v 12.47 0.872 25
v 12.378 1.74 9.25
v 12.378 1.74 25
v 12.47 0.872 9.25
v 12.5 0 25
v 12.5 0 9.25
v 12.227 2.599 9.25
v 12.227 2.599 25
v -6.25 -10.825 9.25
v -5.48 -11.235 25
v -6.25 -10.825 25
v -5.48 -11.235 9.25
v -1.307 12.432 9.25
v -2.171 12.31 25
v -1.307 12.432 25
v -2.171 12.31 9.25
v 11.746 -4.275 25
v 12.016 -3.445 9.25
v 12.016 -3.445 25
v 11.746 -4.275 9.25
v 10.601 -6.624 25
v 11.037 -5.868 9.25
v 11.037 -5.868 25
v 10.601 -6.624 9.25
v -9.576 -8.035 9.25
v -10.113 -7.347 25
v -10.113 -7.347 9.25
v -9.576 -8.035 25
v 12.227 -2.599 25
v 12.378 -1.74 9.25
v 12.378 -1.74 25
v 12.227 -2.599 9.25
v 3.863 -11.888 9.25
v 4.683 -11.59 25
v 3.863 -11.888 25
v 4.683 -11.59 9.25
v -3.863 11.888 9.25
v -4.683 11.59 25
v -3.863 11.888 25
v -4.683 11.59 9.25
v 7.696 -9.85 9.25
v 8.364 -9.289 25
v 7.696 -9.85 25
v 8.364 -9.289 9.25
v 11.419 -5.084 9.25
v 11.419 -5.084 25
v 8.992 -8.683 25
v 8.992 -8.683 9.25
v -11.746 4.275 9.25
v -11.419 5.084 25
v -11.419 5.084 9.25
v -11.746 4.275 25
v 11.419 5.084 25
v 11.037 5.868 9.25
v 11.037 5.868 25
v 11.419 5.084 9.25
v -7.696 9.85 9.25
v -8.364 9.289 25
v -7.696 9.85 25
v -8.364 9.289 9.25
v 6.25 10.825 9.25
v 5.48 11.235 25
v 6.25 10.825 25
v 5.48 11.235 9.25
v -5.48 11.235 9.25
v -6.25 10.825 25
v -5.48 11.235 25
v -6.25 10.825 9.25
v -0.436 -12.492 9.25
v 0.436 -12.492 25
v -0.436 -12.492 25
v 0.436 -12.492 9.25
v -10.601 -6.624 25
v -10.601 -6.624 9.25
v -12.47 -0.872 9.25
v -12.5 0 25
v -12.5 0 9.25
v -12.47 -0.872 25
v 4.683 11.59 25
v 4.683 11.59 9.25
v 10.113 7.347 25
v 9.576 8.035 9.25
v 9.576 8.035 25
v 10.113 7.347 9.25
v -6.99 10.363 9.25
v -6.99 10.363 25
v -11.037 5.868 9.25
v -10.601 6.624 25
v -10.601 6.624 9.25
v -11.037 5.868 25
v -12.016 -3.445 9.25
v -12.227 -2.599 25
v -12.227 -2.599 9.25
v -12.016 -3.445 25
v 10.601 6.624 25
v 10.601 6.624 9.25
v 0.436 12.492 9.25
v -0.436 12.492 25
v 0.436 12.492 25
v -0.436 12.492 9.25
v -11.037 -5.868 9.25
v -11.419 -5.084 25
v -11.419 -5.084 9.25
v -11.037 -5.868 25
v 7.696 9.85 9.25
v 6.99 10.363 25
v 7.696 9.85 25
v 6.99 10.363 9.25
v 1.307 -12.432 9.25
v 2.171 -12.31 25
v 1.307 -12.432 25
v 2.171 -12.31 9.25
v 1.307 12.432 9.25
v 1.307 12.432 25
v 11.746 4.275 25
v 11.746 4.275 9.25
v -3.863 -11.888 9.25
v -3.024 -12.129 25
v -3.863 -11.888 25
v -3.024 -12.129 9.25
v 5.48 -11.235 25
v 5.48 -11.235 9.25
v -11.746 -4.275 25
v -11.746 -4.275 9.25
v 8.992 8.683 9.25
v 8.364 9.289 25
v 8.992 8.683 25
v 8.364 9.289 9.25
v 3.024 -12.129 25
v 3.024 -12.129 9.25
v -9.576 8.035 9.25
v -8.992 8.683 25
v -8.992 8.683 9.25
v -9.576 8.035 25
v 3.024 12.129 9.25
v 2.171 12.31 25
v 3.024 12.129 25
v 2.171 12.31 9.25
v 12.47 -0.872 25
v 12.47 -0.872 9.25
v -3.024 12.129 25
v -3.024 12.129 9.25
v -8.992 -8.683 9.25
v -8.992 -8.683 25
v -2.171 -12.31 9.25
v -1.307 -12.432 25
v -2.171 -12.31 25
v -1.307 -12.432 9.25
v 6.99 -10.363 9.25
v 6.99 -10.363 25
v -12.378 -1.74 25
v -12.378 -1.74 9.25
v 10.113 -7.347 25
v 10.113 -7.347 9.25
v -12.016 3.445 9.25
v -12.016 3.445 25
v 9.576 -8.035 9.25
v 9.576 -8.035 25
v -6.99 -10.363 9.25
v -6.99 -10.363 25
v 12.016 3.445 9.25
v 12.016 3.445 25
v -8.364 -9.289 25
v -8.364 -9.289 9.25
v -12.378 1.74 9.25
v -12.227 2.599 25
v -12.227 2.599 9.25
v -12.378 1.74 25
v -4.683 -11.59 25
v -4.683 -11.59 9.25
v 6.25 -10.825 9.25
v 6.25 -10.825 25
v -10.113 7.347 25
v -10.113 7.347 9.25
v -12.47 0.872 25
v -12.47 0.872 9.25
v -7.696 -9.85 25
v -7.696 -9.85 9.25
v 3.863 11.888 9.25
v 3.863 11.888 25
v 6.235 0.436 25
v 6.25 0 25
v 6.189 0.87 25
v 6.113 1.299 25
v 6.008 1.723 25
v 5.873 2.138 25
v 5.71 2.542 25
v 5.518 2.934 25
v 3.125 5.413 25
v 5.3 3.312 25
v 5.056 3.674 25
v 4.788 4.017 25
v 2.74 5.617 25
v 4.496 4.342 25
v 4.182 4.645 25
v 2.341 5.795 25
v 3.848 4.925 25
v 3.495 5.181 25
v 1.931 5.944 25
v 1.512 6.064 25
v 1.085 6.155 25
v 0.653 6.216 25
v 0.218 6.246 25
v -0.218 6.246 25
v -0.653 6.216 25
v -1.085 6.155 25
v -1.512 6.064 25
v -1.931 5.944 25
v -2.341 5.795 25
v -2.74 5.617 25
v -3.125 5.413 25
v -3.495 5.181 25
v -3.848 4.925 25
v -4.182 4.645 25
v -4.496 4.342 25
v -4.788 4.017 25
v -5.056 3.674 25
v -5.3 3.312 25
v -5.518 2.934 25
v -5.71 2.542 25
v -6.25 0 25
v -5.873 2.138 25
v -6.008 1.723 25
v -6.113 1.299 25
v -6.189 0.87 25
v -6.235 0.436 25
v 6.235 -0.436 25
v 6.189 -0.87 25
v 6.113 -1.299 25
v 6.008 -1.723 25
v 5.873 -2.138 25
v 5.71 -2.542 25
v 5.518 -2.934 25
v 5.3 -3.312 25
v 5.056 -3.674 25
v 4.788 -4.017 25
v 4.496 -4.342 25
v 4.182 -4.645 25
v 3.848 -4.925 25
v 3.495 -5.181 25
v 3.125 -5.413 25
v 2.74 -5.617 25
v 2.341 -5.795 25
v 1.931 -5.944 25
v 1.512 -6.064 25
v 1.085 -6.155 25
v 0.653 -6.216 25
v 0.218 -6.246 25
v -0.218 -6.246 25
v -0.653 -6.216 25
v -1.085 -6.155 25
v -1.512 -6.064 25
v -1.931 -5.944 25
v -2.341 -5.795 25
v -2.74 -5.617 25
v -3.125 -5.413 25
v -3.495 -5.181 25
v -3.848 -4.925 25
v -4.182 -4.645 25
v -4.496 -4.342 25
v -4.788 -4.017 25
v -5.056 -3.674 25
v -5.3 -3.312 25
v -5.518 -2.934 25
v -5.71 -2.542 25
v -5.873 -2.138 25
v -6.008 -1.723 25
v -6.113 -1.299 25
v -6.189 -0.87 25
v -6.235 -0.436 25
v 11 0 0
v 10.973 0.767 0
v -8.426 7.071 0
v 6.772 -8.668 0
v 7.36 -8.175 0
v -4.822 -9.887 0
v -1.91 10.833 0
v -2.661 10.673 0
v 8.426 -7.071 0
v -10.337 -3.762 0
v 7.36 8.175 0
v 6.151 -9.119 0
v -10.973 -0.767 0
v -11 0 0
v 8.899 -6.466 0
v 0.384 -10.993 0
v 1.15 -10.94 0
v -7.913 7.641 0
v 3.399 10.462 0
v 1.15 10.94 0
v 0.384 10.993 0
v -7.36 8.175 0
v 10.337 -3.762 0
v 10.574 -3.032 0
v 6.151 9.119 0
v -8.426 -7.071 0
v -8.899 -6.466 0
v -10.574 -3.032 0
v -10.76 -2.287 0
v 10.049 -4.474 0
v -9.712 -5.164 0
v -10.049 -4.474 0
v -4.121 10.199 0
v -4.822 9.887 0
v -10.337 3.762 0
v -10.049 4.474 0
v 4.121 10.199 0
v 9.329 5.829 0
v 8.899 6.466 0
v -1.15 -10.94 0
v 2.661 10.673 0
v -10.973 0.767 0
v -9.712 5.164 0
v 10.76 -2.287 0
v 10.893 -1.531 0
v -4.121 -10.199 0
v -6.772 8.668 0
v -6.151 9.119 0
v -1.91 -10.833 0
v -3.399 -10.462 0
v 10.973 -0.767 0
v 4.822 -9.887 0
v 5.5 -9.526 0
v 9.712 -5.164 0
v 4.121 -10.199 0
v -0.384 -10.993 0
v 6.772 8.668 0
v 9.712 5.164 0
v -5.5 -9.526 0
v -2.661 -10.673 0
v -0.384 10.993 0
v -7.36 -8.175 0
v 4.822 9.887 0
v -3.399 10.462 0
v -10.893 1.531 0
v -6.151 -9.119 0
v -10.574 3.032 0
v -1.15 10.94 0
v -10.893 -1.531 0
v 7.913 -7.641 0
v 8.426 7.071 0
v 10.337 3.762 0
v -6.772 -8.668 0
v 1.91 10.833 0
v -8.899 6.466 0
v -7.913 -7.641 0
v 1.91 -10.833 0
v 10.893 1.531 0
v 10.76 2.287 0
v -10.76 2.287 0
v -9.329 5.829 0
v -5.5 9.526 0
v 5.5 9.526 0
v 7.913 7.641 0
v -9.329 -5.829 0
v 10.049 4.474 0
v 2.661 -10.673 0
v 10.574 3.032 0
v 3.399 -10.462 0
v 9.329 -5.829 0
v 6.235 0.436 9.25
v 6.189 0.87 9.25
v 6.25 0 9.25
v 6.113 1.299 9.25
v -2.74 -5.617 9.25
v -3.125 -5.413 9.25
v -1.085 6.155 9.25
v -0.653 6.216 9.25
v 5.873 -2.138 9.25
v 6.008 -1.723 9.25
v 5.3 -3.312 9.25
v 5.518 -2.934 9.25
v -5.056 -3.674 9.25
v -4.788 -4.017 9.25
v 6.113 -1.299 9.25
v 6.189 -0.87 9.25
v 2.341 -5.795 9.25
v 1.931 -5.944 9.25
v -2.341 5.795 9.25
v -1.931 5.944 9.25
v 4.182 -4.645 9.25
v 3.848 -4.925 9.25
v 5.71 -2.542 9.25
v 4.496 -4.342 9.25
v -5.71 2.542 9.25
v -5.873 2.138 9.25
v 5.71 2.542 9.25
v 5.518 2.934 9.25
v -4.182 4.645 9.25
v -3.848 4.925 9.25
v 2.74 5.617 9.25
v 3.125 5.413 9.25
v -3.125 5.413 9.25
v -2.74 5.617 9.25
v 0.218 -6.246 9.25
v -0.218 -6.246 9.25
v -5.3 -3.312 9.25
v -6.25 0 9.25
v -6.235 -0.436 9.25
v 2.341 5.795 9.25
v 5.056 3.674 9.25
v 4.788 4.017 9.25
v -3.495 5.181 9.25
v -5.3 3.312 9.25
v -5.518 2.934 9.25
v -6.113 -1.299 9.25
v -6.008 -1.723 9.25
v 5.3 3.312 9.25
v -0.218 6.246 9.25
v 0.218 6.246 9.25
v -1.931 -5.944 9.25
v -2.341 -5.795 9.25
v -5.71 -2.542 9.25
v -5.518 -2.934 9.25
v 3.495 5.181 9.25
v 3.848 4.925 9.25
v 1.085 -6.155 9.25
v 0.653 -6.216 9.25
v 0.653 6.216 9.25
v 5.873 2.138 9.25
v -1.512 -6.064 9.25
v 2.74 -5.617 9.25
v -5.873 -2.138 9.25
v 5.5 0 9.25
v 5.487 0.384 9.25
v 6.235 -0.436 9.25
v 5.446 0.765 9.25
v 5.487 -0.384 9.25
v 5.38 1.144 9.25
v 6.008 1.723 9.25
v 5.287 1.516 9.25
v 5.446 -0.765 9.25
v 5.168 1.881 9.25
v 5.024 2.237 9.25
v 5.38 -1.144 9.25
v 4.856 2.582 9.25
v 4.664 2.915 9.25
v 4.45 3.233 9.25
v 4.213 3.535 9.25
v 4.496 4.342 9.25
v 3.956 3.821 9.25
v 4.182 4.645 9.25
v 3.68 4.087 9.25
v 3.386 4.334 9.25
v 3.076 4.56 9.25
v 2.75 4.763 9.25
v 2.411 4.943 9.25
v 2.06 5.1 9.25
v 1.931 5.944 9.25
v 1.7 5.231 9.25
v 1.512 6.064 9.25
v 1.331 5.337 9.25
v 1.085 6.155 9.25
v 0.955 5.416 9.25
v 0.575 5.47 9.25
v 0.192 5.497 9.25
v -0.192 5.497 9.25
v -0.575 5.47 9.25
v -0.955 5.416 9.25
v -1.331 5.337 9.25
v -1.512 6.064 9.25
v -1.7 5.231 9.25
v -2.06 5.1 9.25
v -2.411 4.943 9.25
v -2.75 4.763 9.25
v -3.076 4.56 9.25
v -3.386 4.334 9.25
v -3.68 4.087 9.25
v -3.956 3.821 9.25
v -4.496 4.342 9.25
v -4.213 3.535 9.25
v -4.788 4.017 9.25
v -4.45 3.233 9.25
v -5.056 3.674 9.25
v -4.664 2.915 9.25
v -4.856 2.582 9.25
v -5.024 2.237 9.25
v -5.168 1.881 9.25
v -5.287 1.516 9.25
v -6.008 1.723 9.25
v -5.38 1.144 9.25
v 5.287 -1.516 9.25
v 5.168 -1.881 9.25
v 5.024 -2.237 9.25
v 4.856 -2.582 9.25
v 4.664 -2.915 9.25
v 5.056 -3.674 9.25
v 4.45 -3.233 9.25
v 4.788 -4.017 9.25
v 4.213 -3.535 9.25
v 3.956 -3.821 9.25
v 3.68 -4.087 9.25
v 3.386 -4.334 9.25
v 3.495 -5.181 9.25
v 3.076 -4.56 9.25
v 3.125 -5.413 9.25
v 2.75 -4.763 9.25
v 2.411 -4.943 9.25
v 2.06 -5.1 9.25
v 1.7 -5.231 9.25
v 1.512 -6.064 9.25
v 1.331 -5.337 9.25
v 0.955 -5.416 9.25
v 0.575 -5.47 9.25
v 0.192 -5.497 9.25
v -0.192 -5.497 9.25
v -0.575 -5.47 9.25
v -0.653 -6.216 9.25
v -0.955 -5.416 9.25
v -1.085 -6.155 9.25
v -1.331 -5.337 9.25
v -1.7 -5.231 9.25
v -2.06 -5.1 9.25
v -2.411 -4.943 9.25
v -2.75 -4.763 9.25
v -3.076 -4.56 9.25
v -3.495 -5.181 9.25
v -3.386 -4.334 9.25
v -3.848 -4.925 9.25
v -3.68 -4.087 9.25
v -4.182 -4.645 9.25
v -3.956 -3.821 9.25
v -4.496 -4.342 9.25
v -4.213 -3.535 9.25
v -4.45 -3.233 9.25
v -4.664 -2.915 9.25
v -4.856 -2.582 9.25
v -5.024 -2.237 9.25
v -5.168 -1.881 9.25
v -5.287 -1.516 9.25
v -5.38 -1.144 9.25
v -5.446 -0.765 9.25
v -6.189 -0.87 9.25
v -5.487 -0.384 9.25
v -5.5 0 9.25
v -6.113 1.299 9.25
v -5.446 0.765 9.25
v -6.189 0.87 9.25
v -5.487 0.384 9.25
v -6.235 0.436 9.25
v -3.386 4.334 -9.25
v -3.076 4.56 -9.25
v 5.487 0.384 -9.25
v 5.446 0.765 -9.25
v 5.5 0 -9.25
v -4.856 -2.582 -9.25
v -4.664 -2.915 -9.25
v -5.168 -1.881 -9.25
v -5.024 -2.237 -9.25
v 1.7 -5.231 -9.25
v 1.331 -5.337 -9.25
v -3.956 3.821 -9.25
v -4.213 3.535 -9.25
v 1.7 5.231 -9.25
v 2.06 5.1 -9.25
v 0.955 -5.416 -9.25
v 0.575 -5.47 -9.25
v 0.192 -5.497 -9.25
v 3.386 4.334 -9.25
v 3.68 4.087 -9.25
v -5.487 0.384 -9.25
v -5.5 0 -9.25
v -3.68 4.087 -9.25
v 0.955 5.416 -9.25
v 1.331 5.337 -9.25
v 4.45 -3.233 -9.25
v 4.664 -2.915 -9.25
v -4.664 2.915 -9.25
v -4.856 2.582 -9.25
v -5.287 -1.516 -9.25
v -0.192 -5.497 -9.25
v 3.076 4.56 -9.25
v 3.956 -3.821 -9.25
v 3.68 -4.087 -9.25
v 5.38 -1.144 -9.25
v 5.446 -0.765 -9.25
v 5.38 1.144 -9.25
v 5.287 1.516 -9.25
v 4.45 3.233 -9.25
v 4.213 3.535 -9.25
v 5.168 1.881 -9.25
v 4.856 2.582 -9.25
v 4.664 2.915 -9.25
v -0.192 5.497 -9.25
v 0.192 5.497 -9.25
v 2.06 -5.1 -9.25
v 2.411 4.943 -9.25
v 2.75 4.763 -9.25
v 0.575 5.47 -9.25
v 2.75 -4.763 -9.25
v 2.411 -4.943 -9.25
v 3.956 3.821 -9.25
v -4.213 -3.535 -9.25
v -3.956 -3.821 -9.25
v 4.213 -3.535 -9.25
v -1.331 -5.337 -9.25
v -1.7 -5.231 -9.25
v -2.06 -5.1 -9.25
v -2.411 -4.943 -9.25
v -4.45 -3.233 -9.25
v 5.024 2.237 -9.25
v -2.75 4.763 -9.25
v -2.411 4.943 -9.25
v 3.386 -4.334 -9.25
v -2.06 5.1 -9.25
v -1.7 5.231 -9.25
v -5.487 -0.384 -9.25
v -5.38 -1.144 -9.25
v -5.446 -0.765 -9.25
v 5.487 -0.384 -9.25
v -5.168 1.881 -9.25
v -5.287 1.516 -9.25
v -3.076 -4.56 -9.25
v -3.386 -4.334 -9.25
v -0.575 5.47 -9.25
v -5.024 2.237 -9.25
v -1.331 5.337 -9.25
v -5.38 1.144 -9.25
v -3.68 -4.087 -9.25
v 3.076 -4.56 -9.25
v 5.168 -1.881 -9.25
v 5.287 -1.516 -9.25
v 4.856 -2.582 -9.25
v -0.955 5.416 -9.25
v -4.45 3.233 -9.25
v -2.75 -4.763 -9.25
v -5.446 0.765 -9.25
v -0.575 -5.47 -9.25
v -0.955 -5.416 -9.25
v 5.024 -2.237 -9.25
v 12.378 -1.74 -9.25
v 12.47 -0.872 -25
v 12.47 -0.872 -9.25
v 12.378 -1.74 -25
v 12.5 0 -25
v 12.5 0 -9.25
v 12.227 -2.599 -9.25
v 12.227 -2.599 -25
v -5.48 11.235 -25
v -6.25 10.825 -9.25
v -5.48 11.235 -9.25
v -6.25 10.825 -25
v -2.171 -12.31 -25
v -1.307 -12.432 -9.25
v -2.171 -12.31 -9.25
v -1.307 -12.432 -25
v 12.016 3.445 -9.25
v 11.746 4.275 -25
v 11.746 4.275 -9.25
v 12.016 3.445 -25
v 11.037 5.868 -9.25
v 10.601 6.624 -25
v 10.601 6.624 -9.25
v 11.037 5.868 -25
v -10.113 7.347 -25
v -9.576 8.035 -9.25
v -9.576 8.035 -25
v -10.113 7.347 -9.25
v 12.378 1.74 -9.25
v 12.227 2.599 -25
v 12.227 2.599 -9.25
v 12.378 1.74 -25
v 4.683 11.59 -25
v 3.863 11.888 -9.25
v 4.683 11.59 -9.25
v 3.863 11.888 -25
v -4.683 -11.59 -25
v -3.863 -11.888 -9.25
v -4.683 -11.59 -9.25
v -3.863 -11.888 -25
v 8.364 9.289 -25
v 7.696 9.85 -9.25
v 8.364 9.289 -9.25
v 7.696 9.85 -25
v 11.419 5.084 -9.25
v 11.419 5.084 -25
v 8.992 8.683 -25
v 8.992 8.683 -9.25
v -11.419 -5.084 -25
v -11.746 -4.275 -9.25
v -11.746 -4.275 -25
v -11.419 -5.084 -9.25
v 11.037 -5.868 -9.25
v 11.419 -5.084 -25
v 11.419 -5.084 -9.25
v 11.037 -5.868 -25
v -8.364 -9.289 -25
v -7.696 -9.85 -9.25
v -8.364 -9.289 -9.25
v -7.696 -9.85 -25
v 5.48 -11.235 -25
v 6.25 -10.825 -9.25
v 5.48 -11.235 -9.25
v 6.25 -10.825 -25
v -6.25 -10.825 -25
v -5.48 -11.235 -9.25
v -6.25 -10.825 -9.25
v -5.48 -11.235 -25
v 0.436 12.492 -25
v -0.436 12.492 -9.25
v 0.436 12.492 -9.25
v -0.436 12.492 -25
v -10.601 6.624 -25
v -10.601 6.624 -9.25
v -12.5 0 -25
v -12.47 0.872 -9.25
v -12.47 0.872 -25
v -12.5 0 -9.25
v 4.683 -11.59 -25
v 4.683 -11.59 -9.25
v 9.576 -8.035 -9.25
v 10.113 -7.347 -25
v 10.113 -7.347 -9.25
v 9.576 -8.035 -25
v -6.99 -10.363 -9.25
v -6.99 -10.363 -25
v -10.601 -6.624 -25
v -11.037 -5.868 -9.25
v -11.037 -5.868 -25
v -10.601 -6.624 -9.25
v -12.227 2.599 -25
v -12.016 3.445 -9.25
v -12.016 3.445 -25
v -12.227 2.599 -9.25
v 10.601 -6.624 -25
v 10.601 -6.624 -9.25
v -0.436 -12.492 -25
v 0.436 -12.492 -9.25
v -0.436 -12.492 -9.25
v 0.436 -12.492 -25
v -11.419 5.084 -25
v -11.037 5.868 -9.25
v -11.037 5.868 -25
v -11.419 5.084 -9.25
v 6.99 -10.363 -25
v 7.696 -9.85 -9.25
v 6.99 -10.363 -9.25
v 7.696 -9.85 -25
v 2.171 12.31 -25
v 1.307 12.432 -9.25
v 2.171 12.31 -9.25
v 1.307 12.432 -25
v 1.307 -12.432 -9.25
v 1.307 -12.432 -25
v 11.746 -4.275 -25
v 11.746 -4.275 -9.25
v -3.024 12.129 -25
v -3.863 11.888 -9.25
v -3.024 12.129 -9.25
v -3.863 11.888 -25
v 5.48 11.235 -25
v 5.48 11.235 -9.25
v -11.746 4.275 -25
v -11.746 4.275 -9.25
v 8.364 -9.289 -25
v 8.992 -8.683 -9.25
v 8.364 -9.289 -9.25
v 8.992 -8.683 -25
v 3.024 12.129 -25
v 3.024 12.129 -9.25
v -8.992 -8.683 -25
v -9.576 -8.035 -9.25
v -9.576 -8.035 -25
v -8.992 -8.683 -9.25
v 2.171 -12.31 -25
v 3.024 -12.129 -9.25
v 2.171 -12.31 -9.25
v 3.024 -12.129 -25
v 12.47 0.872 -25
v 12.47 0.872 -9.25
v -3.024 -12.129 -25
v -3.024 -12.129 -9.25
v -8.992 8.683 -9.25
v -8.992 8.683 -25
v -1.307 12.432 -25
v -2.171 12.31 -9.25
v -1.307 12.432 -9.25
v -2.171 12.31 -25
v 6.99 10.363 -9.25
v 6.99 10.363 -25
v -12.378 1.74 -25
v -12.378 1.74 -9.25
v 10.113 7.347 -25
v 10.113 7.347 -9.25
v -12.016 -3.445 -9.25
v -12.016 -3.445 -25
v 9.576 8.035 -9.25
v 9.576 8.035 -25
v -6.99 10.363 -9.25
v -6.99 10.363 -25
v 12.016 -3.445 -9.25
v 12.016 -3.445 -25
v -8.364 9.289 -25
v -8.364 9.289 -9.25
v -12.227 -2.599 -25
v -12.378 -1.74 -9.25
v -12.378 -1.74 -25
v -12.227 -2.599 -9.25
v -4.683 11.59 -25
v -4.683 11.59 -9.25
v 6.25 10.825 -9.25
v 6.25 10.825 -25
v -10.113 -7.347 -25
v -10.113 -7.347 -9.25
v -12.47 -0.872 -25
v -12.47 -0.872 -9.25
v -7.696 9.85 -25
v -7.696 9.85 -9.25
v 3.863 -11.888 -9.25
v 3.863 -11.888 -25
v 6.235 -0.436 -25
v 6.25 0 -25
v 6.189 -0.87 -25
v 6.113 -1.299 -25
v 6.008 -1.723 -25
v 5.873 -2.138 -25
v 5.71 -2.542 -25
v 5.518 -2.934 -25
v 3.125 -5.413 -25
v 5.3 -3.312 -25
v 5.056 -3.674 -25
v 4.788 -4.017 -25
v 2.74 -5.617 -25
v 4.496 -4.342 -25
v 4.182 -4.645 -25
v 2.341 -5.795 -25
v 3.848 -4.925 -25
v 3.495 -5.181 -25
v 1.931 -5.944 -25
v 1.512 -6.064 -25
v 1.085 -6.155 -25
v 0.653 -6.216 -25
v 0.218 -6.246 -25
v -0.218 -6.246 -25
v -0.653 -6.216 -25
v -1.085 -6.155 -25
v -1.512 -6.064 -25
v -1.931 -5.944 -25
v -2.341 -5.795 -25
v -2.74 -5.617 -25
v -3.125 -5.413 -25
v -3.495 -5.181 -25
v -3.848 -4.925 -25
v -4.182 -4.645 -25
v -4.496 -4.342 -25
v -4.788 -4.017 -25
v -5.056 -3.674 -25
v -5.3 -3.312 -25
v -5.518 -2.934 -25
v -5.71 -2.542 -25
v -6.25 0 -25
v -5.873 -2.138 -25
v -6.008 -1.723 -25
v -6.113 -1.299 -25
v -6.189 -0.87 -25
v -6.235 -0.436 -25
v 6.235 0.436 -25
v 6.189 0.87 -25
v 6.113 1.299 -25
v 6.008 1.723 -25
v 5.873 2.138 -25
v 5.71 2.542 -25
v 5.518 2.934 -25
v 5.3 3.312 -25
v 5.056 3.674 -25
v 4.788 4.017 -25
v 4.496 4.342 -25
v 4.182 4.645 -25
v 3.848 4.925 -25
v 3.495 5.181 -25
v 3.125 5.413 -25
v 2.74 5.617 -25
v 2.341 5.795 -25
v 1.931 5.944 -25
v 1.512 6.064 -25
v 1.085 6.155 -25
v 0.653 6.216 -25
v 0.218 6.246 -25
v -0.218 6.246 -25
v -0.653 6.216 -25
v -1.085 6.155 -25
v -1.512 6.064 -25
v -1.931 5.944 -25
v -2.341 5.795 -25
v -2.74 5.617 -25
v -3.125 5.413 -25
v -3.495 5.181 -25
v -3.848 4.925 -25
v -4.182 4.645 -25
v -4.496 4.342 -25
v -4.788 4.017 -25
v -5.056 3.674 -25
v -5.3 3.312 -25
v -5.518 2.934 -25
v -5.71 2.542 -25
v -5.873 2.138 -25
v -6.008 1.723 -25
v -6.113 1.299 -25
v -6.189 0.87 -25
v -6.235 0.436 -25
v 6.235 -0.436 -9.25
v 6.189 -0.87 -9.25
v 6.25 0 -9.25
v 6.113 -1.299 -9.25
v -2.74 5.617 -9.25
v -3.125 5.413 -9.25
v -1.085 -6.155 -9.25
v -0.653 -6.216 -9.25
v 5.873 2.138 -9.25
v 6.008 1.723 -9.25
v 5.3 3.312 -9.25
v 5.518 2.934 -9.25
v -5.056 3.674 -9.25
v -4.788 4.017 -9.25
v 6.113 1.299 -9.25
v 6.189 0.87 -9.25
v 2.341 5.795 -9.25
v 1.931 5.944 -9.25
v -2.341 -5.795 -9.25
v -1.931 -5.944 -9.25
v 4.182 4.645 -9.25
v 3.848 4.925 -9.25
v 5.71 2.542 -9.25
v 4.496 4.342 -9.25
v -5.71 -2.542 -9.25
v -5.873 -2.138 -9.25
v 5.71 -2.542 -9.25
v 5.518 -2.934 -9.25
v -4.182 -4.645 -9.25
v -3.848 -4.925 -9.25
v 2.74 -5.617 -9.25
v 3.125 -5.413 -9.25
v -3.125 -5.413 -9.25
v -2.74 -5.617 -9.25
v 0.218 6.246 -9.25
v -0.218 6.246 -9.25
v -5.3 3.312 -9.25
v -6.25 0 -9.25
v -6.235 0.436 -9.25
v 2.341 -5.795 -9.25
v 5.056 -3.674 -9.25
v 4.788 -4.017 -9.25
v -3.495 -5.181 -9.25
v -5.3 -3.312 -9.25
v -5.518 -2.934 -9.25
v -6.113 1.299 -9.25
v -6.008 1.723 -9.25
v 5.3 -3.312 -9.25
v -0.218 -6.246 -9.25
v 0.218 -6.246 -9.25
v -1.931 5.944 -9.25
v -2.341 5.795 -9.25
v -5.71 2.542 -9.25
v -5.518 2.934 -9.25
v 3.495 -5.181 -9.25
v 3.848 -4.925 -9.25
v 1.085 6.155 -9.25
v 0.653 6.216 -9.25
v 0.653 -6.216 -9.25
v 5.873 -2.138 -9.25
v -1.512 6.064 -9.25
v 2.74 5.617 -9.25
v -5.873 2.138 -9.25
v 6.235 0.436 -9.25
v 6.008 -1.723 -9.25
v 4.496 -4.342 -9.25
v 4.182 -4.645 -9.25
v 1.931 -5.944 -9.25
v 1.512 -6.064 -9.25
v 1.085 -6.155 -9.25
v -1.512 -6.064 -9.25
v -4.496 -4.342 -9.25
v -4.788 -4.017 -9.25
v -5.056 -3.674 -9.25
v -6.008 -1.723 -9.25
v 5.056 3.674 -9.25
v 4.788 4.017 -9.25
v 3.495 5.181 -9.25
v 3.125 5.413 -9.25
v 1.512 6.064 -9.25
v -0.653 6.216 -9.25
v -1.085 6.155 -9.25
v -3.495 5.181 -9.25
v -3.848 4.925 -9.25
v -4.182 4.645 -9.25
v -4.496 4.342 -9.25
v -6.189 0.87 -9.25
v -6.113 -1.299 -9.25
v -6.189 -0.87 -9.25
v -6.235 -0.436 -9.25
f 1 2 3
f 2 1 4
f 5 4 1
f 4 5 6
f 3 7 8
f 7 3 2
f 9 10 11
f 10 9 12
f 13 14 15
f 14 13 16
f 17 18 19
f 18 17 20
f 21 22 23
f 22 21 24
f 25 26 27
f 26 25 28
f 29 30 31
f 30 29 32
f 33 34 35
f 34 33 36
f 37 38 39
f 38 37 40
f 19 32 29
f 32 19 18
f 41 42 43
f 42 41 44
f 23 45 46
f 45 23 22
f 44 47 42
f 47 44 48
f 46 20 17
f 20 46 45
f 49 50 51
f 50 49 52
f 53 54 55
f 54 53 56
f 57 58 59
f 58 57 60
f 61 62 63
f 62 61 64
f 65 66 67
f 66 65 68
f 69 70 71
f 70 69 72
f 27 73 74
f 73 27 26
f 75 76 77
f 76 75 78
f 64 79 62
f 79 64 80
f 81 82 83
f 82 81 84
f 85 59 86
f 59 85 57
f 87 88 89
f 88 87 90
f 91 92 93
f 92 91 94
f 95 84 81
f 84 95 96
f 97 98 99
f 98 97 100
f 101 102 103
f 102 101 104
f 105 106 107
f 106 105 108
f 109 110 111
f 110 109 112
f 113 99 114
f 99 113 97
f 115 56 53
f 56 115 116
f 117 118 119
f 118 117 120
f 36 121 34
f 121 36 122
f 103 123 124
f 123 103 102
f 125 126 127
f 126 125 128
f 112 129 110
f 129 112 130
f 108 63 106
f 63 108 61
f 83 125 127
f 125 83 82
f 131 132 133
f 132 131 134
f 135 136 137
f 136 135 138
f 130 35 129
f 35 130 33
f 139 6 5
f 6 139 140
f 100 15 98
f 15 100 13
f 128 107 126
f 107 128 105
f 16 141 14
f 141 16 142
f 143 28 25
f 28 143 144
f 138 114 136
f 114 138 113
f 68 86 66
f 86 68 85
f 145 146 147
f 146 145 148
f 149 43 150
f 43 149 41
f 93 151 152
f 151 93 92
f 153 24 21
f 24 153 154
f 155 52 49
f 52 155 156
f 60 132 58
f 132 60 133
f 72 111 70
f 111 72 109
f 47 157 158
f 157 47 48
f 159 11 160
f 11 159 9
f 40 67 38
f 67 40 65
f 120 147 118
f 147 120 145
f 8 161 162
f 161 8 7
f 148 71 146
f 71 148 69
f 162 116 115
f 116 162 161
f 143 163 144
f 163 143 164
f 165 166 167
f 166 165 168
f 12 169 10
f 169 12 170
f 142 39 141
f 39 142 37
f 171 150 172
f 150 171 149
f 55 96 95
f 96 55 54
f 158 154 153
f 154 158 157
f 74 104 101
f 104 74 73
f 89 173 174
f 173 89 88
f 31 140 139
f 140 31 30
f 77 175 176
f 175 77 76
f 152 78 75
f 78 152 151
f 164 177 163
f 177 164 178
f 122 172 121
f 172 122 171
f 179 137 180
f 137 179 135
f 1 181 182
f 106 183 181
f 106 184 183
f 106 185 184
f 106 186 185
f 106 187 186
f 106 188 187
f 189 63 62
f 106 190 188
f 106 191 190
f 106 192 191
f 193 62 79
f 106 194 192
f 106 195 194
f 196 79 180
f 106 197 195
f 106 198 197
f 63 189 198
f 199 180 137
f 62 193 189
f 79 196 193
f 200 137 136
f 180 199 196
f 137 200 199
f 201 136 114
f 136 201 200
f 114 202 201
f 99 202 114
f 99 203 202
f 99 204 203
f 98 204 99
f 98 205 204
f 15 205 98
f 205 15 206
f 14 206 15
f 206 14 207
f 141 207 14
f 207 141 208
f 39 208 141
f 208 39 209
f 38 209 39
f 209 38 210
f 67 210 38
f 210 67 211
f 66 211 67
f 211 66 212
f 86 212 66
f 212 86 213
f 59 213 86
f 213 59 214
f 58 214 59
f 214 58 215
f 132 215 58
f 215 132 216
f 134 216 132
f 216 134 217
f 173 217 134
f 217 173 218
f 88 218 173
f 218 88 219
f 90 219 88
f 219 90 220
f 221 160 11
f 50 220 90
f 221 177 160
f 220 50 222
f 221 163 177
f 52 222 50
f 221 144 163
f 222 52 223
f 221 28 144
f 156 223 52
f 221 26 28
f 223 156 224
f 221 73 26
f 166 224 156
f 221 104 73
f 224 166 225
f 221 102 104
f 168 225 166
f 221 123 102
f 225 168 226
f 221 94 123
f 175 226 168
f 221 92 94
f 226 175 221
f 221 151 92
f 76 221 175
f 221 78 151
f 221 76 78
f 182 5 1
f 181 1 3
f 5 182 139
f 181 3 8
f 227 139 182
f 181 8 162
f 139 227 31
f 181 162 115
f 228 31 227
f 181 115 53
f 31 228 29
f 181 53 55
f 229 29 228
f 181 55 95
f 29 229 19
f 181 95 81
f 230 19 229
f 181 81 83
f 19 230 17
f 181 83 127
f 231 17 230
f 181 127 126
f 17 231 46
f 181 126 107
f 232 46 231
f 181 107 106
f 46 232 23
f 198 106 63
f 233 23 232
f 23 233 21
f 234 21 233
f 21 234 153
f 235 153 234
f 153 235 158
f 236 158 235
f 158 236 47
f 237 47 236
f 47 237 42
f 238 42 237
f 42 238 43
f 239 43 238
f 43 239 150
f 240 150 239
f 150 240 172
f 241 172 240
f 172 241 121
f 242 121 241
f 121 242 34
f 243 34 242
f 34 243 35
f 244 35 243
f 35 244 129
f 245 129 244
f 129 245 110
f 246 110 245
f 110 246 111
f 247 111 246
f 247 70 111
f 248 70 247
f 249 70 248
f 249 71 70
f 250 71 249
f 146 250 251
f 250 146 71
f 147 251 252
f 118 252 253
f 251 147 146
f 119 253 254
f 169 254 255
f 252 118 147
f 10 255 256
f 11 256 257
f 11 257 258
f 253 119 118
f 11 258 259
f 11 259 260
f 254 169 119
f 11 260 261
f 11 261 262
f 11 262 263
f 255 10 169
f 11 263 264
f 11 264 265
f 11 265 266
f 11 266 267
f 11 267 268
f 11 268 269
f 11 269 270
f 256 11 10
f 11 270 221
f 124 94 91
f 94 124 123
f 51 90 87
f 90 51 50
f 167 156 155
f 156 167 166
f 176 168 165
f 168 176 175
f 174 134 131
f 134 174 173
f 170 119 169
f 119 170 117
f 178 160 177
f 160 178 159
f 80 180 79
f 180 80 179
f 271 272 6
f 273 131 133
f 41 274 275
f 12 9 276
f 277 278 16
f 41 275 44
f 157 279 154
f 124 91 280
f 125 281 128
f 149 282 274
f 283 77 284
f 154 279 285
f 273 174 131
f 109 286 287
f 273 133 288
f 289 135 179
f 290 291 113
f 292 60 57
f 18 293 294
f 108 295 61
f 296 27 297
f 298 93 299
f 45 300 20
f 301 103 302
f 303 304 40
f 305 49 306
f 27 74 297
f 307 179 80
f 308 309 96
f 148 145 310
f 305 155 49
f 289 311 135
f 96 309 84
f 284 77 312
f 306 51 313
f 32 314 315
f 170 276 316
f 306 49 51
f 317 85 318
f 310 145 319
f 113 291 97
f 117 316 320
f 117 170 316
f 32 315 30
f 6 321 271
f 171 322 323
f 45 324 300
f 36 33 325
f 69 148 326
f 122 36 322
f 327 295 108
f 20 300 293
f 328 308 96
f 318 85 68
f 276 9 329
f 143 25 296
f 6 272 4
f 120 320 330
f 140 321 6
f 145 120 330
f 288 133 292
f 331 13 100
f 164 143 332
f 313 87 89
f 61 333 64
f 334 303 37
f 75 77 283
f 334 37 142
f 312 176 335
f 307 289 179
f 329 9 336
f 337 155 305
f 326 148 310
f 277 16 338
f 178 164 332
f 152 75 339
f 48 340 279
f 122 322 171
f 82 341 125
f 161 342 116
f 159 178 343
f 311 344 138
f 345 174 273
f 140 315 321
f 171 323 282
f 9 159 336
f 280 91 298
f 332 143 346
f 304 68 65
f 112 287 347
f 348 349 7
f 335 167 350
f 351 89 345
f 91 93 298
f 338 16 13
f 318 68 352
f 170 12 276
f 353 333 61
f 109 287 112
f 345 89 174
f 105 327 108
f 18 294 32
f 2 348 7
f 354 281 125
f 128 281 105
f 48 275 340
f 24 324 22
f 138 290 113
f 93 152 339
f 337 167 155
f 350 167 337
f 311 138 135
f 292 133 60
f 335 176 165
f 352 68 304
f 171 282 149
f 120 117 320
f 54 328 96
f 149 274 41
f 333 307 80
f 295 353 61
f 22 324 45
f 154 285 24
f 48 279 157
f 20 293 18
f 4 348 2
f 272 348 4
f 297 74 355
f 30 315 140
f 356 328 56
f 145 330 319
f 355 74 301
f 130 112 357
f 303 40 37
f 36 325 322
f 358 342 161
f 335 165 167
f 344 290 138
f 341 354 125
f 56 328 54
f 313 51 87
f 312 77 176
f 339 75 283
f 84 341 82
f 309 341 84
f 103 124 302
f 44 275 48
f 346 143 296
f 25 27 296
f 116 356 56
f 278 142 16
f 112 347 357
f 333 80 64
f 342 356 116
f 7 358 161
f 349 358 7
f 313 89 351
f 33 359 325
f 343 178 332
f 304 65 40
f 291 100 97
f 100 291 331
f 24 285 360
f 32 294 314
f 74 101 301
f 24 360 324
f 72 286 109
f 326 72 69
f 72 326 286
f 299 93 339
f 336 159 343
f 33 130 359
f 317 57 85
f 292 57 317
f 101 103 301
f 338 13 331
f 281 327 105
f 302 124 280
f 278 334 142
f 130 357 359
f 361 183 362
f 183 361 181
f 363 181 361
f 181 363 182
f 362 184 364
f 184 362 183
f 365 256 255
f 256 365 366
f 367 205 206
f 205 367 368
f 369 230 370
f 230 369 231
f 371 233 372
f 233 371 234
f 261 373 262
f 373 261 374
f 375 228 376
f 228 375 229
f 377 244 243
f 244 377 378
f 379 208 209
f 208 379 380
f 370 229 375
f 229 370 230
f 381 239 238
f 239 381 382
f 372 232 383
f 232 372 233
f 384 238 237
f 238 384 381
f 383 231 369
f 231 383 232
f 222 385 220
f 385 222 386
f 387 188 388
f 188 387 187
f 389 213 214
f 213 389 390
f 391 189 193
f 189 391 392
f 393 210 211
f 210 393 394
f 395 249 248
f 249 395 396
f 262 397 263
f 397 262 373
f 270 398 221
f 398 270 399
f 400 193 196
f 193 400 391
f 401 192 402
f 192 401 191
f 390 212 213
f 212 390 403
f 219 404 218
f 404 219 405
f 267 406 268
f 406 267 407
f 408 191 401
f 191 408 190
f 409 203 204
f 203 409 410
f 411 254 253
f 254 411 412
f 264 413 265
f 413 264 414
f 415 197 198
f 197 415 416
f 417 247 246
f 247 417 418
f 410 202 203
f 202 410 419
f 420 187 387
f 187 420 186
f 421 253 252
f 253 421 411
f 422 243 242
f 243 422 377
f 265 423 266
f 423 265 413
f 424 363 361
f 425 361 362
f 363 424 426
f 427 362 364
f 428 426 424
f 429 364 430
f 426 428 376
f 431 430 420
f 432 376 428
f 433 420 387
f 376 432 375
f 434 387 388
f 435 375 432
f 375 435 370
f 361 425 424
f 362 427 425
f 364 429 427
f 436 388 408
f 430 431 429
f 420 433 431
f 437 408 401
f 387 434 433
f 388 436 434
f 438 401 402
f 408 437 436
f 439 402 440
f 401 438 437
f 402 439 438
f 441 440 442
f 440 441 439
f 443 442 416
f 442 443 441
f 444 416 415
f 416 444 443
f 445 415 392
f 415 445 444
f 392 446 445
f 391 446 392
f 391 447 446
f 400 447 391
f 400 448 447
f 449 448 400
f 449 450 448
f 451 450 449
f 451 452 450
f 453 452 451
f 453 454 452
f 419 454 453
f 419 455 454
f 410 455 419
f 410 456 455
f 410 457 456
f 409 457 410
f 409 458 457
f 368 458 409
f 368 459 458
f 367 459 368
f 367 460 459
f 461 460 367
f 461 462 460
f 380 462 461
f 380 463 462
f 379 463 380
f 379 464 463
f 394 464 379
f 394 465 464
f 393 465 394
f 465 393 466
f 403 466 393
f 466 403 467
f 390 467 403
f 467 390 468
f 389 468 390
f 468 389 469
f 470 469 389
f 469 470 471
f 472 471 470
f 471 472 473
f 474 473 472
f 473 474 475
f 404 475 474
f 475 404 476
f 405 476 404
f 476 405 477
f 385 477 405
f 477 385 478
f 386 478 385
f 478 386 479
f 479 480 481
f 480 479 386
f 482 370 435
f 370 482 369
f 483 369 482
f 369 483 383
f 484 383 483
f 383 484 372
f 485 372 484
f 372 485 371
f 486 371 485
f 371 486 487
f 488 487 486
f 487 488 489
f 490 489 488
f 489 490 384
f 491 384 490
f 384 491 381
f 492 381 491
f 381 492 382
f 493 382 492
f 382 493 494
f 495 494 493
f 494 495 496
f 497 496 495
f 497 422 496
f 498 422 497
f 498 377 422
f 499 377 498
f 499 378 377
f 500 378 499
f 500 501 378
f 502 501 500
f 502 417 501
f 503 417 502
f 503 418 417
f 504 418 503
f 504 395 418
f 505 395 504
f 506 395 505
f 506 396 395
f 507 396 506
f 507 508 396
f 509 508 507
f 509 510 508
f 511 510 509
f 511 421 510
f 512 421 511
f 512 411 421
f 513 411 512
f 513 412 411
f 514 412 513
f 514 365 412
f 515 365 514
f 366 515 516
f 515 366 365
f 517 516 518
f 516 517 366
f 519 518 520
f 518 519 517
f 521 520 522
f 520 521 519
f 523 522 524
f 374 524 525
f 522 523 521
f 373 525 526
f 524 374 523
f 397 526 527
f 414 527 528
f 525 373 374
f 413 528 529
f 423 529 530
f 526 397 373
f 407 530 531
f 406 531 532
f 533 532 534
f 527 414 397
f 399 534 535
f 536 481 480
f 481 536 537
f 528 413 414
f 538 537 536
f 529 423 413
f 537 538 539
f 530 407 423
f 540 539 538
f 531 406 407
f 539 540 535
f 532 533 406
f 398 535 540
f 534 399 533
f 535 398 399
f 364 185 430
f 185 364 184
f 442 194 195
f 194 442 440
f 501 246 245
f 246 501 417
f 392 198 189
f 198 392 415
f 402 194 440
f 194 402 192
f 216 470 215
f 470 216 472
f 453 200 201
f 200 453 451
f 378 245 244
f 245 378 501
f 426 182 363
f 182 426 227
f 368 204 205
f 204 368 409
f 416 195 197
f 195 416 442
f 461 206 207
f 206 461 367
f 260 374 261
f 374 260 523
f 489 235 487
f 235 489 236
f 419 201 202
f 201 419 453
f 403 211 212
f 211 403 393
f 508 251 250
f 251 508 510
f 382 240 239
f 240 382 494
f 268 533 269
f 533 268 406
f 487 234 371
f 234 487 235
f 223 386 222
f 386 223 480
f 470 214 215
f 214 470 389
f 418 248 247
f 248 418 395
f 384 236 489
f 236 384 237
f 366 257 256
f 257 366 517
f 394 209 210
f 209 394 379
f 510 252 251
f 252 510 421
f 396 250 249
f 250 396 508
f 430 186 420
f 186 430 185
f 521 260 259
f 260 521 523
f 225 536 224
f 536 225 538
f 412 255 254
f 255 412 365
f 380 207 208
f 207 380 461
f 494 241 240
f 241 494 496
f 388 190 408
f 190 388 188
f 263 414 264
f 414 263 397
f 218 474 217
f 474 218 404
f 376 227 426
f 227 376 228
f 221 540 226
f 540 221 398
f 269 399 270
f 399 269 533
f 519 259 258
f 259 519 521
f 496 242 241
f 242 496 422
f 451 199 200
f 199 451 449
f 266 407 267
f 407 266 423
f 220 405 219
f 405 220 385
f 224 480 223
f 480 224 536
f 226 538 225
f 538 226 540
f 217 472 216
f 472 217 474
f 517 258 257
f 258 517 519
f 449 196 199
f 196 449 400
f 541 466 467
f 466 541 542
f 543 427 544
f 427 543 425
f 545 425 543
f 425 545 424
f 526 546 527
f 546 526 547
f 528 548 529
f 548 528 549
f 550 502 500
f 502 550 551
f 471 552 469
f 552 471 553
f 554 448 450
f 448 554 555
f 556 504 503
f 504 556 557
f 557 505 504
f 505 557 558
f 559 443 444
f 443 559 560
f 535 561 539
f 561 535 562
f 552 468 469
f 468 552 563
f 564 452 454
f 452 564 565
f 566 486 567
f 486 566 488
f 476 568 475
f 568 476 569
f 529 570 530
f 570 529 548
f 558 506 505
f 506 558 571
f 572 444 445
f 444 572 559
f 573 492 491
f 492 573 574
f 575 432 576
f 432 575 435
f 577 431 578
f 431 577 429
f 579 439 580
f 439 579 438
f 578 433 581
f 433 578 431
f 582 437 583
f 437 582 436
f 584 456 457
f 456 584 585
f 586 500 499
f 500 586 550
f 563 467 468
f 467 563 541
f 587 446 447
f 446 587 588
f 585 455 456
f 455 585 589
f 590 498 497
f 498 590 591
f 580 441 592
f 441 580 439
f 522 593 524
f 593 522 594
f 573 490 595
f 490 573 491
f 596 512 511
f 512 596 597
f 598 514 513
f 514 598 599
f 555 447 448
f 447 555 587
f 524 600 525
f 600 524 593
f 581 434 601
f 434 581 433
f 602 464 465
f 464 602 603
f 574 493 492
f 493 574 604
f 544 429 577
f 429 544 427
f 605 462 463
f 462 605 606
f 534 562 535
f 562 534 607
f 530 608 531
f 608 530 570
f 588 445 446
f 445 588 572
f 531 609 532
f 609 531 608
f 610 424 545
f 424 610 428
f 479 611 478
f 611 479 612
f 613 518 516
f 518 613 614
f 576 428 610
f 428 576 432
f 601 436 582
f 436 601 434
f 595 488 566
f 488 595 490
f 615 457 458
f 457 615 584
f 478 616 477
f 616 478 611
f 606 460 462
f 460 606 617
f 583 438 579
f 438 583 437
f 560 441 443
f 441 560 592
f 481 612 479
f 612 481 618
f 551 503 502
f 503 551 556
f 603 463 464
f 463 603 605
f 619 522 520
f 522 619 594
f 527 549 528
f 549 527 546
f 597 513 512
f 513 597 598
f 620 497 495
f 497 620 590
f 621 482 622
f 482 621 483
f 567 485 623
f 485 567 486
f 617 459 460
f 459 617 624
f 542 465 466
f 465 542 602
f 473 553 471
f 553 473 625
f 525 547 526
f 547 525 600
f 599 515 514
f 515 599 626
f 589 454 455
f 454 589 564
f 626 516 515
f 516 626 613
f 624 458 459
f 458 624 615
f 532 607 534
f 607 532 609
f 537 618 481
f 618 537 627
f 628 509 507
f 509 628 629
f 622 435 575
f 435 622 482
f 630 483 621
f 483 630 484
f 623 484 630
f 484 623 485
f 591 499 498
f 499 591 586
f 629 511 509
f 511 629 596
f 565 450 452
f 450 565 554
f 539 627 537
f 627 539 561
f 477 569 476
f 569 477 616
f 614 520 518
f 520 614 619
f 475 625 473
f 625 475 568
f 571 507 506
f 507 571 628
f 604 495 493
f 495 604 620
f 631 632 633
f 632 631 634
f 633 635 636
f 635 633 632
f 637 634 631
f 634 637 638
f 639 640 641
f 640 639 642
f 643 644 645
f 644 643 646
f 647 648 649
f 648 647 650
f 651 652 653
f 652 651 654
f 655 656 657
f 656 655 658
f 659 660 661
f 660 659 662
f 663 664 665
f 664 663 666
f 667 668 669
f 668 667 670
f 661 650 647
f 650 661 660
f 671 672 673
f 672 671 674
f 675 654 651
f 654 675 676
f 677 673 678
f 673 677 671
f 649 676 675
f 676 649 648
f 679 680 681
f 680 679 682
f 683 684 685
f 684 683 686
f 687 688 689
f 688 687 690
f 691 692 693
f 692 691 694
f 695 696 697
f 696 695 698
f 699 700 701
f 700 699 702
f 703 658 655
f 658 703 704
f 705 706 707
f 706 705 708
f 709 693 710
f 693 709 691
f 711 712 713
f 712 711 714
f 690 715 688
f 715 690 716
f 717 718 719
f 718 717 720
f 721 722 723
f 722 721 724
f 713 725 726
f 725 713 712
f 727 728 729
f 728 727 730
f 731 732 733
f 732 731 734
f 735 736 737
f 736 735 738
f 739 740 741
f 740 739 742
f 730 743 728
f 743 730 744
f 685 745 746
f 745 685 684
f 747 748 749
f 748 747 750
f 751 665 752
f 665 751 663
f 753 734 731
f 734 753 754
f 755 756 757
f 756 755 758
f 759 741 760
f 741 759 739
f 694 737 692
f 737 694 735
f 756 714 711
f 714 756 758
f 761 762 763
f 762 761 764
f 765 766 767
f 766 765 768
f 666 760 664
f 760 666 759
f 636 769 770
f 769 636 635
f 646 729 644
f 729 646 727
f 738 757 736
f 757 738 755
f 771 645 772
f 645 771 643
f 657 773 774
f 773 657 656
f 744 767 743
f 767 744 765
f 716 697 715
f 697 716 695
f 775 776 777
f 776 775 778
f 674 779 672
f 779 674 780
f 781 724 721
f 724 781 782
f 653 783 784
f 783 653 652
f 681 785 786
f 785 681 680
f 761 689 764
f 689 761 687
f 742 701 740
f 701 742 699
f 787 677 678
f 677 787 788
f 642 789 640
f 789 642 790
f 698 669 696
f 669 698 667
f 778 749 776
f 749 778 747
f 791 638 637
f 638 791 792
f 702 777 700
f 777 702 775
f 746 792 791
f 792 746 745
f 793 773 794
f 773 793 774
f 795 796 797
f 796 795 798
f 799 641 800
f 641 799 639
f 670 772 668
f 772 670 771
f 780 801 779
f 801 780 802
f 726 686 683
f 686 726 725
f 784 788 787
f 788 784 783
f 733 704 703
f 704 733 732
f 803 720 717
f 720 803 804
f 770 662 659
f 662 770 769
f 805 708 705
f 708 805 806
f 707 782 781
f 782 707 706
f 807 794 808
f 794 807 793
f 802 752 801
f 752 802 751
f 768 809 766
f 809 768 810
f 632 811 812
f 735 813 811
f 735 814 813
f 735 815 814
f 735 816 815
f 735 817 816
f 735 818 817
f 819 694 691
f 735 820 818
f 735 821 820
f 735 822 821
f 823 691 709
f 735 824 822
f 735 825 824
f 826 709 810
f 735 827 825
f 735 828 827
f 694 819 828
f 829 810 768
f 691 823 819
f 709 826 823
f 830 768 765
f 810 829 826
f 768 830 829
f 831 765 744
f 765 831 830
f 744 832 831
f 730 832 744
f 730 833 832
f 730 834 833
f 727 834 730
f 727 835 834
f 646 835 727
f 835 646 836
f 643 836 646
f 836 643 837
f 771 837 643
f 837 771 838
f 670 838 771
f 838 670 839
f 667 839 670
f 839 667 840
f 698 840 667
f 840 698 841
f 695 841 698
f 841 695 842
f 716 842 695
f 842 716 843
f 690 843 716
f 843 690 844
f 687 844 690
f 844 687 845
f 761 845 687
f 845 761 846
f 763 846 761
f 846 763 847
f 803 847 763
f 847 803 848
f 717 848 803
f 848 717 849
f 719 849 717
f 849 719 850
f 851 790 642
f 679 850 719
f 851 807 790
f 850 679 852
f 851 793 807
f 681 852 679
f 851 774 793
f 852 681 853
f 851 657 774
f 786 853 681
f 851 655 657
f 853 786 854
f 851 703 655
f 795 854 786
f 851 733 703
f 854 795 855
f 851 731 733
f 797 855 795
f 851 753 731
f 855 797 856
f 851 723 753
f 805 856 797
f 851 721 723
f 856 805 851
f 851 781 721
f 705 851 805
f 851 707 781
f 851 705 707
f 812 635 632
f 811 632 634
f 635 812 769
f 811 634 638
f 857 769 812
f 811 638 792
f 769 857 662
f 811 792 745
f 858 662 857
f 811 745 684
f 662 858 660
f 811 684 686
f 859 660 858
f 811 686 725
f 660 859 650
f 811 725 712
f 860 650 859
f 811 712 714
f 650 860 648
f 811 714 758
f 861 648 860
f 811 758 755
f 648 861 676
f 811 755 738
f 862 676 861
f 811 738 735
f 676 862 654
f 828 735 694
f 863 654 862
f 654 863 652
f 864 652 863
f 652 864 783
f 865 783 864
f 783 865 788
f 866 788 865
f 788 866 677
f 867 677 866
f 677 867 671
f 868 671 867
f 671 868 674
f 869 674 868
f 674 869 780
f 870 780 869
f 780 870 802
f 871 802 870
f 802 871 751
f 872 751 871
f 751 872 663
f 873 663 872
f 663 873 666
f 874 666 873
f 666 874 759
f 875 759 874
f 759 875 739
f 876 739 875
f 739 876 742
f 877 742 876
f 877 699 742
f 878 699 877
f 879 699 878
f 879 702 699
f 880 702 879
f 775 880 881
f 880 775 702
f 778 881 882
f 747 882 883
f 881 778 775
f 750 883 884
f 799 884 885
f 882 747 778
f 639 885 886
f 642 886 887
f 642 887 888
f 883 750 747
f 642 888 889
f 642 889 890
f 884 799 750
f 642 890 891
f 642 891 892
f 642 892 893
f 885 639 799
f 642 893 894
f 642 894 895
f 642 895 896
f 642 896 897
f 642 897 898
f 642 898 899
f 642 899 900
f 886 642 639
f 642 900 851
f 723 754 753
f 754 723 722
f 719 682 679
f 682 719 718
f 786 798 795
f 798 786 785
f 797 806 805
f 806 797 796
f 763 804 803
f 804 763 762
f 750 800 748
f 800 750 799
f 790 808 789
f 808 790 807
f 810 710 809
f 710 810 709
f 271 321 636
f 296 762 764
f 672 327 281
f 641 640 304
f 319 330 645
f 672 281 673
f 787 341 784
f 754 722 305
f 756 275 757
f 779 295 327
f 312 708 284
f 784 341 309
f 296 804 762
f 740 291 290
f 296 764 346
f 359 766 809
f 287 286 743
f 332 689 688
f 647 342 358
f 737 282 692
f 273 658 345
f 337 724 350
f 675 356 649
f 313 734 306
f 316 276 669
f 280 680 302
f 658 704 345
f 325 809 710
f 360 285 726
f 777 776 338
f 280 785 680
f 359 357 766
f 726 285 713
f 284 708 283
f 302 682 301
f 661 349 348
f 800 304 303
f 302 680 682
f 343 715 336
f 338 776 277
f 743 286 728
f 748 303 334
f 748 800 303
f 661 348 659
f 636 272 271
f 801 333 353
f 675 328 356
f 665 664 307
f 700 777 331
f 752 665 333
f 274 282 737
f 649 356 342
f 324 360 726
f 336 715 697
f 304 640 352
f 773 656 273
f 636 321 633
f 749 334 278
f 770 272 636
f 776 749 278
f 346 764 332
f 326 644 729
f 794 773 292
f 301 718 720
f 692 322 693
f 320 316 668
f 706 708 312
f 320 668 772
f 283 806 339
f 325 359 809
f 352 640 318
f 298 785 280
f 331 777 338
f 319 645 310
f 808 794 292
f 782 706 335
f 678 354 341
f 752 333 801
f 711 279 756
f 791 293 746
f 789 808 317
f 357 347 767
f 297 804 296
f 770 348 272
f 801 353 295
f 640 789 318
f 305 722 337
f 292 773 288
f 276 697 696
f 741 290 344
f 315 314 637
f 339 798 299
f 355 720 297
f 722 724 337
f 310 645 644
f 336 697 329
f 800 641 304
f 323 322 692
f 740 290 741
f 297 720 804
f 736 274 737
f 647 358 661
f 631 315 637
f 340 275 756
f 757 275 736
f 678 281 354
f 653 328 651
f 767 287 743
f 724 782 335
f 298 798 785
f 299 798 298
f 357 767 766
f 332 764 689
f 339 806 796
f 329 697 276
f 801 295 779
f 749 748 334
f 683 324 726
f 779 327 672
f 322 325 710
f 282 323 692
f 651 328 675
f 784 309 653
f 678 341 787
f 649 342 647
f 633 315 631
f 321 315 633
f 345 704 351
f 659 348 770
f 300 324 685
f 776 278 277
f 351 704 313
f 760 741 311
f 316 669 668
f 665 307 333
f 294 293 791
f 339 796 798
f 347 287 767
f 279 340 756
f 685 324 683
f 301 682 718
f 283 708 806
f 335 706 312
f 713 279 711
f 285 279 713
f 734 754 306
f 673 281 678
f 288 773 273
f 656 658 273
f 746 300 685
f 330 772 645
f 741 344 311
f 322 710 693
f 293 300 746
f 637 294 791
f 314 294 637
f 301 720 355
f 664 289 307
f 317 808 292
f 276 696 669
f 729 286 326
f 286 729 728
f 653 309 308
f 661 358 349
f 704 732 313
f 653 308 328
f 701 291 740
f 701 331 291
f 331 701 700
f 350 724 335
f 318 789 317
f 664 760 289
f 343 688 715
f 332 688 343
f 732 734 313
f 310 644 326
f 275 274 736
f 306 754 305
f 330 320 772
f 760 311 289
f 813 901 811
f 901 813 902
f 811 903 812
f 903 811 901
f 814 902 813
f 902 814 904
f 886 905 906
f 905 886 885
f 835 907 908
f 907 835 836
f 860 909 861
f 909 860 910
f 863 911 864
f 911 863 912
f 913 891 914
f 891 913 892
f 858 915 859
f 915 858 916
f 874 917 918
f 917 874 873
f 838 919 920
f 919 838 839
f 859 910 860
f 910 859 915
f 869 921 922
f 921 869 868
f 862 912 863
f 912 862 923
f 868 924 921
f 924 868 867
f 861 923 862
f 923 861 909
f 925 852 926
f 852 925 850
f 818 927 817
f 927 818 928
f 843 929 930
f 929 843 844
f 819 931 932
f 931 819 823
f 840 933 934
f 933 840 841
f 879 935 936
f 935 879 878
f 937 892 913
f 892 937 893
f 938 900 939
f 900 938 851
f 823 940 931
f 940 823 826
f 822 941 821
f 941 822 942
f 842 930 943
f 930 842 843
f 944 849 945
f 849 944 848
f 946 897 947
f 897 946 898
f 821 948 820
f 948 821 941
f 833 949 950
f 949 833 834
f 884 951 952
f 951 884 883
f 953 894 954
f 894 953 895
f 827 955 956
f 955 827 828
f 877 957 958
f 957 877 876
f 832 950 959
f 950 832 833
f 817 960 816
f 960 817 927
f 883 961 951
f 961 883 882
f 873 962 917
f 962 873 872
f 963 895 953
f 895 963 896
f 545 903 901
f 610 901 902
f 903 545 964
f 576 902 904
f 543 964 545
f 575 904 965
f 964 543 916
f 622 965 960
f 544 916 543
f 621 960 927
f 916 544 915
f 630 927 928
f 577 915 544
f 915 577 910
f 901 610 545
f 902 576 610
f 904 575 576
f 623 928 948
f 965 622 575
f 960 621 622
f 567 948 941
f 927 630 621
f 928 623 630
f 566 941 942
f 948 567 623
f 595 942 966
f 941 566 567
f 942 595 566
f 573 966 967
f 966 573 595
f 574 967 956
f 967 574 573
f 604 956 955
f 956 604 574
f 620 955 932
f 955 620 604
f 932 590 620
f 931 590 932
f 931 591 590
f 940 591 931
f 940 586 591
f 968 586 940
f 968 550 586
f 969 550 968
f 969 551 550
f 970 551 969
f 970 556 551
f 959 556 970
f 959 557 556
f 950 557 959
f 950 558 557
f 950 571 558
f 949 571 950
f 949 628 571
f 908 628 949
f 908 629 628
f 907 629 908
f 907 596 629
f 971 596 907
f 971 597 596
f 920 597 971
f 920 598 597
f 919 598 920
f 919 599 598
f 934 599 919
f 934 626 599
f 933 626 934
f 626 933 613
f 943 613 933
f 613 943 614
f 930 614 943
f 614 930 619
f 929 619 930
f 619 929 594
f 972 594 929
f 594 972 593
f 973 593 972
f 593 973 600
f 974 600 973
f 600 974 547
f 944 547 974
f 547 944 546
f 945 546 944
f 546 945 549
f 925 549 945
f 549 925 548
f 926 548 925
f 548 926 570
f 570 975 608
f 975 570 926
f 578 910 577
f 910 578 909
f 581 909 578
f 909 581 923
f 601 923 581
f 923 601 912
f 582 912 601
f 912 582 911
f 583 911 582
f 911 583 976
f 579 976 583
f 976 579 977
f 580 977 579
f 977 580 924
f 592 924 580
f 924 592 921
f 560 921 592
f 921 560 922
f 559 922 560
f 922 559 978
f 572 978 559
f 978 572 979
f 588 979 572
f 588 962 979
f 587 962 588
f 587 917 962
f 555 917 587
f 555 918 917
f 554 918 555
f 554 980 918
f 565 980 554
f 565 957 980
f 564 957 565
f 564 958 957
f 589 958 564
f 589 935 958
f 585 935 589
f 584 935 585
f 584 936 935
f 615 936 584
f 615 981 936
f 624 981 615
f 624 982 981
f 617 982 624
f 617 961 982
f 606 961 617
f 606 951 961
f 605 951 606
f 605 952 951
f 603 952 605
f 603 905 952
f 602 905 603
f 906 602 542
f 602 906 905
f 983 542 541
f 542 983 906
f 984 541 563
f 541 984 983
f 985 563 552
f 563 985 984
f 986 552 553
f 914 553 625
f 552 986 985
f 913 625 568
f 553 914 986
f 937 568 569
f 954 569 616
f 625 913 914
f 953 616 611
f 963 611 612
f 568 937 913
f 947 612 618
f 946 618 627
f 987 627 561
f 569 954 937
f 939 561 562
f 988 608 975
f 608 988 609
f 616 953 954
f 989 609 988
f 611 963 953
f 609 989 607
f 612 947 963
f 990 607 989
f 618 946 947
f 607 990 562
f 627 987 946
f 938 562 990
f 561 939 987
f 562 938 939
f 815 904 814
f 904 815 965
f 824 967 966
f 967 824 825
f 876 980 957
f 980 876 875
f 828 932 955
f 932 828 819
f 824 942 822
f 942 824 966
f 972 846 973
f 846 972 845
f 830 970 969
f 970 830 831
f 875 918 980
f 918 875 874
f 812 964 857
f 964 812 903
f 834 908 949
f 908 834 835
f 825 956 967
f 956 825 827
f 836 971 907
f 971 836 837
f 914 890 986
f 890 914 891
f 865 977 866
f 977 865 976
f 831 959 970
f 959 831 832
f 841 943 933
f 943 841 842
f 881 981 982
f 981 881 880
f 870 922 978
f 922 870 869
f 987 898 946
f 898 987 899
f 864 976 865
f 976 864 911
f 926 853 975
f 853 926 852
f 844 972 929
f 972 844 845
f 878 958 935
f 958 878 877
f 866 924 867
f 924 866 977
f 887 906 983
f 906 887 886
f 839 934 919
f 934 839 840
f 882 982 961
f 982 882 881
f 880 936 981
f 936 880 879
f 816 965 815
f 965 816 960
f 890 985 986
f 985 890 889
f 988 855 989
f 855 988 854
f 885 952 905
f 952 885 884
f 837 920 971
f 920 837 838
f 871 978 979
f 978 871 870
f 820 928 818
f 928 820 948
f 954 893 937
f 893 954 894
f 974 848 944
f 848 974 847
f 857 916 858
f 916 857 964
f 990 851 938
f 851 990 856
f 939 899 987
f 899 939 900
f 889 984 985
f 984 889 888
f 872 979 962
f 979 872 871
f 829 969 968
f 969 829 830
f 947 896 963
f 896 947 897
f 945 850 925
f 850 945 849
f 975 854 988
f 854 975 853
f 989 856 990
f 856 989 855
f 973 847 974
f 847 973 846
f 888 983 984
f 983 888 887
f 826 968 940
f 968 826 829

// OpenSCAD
//Bitloeser 
$fn=90;
//Tickness
t=10;
//Durchmesser oben
do=12.5;
//Durchmesser unten
du=11;
//Länge unten
lu=9.25;
//Länge total
lt=25;
//Länge Bit
lb=25;
//Durchmesser innen
di=8;

//Länge oben
lo=lt-lu;

//Scale
s=2.0;

module bitholder() {
    translate([0,0,lu])
    cylinder(h=lo, d=do);
    cylinder(h=lu, d=du);
}

module bitholder_out() {
    translate([0,0,lu])
    cylinder(h=lo, d=do);
    cylinder(h=lu, d2=do,d1=du);
}

module bitloeser() {
    difference() {
        scale([s,s,1])
        bitholder_out();
        bitholder();
    }
}

module bitholder_withhole() {
    difference() {
        bitholder();
        cylinder(h=lt, d=di);
    }
}


bitloeser();
rotate([180,0,0])
bitloeser();
